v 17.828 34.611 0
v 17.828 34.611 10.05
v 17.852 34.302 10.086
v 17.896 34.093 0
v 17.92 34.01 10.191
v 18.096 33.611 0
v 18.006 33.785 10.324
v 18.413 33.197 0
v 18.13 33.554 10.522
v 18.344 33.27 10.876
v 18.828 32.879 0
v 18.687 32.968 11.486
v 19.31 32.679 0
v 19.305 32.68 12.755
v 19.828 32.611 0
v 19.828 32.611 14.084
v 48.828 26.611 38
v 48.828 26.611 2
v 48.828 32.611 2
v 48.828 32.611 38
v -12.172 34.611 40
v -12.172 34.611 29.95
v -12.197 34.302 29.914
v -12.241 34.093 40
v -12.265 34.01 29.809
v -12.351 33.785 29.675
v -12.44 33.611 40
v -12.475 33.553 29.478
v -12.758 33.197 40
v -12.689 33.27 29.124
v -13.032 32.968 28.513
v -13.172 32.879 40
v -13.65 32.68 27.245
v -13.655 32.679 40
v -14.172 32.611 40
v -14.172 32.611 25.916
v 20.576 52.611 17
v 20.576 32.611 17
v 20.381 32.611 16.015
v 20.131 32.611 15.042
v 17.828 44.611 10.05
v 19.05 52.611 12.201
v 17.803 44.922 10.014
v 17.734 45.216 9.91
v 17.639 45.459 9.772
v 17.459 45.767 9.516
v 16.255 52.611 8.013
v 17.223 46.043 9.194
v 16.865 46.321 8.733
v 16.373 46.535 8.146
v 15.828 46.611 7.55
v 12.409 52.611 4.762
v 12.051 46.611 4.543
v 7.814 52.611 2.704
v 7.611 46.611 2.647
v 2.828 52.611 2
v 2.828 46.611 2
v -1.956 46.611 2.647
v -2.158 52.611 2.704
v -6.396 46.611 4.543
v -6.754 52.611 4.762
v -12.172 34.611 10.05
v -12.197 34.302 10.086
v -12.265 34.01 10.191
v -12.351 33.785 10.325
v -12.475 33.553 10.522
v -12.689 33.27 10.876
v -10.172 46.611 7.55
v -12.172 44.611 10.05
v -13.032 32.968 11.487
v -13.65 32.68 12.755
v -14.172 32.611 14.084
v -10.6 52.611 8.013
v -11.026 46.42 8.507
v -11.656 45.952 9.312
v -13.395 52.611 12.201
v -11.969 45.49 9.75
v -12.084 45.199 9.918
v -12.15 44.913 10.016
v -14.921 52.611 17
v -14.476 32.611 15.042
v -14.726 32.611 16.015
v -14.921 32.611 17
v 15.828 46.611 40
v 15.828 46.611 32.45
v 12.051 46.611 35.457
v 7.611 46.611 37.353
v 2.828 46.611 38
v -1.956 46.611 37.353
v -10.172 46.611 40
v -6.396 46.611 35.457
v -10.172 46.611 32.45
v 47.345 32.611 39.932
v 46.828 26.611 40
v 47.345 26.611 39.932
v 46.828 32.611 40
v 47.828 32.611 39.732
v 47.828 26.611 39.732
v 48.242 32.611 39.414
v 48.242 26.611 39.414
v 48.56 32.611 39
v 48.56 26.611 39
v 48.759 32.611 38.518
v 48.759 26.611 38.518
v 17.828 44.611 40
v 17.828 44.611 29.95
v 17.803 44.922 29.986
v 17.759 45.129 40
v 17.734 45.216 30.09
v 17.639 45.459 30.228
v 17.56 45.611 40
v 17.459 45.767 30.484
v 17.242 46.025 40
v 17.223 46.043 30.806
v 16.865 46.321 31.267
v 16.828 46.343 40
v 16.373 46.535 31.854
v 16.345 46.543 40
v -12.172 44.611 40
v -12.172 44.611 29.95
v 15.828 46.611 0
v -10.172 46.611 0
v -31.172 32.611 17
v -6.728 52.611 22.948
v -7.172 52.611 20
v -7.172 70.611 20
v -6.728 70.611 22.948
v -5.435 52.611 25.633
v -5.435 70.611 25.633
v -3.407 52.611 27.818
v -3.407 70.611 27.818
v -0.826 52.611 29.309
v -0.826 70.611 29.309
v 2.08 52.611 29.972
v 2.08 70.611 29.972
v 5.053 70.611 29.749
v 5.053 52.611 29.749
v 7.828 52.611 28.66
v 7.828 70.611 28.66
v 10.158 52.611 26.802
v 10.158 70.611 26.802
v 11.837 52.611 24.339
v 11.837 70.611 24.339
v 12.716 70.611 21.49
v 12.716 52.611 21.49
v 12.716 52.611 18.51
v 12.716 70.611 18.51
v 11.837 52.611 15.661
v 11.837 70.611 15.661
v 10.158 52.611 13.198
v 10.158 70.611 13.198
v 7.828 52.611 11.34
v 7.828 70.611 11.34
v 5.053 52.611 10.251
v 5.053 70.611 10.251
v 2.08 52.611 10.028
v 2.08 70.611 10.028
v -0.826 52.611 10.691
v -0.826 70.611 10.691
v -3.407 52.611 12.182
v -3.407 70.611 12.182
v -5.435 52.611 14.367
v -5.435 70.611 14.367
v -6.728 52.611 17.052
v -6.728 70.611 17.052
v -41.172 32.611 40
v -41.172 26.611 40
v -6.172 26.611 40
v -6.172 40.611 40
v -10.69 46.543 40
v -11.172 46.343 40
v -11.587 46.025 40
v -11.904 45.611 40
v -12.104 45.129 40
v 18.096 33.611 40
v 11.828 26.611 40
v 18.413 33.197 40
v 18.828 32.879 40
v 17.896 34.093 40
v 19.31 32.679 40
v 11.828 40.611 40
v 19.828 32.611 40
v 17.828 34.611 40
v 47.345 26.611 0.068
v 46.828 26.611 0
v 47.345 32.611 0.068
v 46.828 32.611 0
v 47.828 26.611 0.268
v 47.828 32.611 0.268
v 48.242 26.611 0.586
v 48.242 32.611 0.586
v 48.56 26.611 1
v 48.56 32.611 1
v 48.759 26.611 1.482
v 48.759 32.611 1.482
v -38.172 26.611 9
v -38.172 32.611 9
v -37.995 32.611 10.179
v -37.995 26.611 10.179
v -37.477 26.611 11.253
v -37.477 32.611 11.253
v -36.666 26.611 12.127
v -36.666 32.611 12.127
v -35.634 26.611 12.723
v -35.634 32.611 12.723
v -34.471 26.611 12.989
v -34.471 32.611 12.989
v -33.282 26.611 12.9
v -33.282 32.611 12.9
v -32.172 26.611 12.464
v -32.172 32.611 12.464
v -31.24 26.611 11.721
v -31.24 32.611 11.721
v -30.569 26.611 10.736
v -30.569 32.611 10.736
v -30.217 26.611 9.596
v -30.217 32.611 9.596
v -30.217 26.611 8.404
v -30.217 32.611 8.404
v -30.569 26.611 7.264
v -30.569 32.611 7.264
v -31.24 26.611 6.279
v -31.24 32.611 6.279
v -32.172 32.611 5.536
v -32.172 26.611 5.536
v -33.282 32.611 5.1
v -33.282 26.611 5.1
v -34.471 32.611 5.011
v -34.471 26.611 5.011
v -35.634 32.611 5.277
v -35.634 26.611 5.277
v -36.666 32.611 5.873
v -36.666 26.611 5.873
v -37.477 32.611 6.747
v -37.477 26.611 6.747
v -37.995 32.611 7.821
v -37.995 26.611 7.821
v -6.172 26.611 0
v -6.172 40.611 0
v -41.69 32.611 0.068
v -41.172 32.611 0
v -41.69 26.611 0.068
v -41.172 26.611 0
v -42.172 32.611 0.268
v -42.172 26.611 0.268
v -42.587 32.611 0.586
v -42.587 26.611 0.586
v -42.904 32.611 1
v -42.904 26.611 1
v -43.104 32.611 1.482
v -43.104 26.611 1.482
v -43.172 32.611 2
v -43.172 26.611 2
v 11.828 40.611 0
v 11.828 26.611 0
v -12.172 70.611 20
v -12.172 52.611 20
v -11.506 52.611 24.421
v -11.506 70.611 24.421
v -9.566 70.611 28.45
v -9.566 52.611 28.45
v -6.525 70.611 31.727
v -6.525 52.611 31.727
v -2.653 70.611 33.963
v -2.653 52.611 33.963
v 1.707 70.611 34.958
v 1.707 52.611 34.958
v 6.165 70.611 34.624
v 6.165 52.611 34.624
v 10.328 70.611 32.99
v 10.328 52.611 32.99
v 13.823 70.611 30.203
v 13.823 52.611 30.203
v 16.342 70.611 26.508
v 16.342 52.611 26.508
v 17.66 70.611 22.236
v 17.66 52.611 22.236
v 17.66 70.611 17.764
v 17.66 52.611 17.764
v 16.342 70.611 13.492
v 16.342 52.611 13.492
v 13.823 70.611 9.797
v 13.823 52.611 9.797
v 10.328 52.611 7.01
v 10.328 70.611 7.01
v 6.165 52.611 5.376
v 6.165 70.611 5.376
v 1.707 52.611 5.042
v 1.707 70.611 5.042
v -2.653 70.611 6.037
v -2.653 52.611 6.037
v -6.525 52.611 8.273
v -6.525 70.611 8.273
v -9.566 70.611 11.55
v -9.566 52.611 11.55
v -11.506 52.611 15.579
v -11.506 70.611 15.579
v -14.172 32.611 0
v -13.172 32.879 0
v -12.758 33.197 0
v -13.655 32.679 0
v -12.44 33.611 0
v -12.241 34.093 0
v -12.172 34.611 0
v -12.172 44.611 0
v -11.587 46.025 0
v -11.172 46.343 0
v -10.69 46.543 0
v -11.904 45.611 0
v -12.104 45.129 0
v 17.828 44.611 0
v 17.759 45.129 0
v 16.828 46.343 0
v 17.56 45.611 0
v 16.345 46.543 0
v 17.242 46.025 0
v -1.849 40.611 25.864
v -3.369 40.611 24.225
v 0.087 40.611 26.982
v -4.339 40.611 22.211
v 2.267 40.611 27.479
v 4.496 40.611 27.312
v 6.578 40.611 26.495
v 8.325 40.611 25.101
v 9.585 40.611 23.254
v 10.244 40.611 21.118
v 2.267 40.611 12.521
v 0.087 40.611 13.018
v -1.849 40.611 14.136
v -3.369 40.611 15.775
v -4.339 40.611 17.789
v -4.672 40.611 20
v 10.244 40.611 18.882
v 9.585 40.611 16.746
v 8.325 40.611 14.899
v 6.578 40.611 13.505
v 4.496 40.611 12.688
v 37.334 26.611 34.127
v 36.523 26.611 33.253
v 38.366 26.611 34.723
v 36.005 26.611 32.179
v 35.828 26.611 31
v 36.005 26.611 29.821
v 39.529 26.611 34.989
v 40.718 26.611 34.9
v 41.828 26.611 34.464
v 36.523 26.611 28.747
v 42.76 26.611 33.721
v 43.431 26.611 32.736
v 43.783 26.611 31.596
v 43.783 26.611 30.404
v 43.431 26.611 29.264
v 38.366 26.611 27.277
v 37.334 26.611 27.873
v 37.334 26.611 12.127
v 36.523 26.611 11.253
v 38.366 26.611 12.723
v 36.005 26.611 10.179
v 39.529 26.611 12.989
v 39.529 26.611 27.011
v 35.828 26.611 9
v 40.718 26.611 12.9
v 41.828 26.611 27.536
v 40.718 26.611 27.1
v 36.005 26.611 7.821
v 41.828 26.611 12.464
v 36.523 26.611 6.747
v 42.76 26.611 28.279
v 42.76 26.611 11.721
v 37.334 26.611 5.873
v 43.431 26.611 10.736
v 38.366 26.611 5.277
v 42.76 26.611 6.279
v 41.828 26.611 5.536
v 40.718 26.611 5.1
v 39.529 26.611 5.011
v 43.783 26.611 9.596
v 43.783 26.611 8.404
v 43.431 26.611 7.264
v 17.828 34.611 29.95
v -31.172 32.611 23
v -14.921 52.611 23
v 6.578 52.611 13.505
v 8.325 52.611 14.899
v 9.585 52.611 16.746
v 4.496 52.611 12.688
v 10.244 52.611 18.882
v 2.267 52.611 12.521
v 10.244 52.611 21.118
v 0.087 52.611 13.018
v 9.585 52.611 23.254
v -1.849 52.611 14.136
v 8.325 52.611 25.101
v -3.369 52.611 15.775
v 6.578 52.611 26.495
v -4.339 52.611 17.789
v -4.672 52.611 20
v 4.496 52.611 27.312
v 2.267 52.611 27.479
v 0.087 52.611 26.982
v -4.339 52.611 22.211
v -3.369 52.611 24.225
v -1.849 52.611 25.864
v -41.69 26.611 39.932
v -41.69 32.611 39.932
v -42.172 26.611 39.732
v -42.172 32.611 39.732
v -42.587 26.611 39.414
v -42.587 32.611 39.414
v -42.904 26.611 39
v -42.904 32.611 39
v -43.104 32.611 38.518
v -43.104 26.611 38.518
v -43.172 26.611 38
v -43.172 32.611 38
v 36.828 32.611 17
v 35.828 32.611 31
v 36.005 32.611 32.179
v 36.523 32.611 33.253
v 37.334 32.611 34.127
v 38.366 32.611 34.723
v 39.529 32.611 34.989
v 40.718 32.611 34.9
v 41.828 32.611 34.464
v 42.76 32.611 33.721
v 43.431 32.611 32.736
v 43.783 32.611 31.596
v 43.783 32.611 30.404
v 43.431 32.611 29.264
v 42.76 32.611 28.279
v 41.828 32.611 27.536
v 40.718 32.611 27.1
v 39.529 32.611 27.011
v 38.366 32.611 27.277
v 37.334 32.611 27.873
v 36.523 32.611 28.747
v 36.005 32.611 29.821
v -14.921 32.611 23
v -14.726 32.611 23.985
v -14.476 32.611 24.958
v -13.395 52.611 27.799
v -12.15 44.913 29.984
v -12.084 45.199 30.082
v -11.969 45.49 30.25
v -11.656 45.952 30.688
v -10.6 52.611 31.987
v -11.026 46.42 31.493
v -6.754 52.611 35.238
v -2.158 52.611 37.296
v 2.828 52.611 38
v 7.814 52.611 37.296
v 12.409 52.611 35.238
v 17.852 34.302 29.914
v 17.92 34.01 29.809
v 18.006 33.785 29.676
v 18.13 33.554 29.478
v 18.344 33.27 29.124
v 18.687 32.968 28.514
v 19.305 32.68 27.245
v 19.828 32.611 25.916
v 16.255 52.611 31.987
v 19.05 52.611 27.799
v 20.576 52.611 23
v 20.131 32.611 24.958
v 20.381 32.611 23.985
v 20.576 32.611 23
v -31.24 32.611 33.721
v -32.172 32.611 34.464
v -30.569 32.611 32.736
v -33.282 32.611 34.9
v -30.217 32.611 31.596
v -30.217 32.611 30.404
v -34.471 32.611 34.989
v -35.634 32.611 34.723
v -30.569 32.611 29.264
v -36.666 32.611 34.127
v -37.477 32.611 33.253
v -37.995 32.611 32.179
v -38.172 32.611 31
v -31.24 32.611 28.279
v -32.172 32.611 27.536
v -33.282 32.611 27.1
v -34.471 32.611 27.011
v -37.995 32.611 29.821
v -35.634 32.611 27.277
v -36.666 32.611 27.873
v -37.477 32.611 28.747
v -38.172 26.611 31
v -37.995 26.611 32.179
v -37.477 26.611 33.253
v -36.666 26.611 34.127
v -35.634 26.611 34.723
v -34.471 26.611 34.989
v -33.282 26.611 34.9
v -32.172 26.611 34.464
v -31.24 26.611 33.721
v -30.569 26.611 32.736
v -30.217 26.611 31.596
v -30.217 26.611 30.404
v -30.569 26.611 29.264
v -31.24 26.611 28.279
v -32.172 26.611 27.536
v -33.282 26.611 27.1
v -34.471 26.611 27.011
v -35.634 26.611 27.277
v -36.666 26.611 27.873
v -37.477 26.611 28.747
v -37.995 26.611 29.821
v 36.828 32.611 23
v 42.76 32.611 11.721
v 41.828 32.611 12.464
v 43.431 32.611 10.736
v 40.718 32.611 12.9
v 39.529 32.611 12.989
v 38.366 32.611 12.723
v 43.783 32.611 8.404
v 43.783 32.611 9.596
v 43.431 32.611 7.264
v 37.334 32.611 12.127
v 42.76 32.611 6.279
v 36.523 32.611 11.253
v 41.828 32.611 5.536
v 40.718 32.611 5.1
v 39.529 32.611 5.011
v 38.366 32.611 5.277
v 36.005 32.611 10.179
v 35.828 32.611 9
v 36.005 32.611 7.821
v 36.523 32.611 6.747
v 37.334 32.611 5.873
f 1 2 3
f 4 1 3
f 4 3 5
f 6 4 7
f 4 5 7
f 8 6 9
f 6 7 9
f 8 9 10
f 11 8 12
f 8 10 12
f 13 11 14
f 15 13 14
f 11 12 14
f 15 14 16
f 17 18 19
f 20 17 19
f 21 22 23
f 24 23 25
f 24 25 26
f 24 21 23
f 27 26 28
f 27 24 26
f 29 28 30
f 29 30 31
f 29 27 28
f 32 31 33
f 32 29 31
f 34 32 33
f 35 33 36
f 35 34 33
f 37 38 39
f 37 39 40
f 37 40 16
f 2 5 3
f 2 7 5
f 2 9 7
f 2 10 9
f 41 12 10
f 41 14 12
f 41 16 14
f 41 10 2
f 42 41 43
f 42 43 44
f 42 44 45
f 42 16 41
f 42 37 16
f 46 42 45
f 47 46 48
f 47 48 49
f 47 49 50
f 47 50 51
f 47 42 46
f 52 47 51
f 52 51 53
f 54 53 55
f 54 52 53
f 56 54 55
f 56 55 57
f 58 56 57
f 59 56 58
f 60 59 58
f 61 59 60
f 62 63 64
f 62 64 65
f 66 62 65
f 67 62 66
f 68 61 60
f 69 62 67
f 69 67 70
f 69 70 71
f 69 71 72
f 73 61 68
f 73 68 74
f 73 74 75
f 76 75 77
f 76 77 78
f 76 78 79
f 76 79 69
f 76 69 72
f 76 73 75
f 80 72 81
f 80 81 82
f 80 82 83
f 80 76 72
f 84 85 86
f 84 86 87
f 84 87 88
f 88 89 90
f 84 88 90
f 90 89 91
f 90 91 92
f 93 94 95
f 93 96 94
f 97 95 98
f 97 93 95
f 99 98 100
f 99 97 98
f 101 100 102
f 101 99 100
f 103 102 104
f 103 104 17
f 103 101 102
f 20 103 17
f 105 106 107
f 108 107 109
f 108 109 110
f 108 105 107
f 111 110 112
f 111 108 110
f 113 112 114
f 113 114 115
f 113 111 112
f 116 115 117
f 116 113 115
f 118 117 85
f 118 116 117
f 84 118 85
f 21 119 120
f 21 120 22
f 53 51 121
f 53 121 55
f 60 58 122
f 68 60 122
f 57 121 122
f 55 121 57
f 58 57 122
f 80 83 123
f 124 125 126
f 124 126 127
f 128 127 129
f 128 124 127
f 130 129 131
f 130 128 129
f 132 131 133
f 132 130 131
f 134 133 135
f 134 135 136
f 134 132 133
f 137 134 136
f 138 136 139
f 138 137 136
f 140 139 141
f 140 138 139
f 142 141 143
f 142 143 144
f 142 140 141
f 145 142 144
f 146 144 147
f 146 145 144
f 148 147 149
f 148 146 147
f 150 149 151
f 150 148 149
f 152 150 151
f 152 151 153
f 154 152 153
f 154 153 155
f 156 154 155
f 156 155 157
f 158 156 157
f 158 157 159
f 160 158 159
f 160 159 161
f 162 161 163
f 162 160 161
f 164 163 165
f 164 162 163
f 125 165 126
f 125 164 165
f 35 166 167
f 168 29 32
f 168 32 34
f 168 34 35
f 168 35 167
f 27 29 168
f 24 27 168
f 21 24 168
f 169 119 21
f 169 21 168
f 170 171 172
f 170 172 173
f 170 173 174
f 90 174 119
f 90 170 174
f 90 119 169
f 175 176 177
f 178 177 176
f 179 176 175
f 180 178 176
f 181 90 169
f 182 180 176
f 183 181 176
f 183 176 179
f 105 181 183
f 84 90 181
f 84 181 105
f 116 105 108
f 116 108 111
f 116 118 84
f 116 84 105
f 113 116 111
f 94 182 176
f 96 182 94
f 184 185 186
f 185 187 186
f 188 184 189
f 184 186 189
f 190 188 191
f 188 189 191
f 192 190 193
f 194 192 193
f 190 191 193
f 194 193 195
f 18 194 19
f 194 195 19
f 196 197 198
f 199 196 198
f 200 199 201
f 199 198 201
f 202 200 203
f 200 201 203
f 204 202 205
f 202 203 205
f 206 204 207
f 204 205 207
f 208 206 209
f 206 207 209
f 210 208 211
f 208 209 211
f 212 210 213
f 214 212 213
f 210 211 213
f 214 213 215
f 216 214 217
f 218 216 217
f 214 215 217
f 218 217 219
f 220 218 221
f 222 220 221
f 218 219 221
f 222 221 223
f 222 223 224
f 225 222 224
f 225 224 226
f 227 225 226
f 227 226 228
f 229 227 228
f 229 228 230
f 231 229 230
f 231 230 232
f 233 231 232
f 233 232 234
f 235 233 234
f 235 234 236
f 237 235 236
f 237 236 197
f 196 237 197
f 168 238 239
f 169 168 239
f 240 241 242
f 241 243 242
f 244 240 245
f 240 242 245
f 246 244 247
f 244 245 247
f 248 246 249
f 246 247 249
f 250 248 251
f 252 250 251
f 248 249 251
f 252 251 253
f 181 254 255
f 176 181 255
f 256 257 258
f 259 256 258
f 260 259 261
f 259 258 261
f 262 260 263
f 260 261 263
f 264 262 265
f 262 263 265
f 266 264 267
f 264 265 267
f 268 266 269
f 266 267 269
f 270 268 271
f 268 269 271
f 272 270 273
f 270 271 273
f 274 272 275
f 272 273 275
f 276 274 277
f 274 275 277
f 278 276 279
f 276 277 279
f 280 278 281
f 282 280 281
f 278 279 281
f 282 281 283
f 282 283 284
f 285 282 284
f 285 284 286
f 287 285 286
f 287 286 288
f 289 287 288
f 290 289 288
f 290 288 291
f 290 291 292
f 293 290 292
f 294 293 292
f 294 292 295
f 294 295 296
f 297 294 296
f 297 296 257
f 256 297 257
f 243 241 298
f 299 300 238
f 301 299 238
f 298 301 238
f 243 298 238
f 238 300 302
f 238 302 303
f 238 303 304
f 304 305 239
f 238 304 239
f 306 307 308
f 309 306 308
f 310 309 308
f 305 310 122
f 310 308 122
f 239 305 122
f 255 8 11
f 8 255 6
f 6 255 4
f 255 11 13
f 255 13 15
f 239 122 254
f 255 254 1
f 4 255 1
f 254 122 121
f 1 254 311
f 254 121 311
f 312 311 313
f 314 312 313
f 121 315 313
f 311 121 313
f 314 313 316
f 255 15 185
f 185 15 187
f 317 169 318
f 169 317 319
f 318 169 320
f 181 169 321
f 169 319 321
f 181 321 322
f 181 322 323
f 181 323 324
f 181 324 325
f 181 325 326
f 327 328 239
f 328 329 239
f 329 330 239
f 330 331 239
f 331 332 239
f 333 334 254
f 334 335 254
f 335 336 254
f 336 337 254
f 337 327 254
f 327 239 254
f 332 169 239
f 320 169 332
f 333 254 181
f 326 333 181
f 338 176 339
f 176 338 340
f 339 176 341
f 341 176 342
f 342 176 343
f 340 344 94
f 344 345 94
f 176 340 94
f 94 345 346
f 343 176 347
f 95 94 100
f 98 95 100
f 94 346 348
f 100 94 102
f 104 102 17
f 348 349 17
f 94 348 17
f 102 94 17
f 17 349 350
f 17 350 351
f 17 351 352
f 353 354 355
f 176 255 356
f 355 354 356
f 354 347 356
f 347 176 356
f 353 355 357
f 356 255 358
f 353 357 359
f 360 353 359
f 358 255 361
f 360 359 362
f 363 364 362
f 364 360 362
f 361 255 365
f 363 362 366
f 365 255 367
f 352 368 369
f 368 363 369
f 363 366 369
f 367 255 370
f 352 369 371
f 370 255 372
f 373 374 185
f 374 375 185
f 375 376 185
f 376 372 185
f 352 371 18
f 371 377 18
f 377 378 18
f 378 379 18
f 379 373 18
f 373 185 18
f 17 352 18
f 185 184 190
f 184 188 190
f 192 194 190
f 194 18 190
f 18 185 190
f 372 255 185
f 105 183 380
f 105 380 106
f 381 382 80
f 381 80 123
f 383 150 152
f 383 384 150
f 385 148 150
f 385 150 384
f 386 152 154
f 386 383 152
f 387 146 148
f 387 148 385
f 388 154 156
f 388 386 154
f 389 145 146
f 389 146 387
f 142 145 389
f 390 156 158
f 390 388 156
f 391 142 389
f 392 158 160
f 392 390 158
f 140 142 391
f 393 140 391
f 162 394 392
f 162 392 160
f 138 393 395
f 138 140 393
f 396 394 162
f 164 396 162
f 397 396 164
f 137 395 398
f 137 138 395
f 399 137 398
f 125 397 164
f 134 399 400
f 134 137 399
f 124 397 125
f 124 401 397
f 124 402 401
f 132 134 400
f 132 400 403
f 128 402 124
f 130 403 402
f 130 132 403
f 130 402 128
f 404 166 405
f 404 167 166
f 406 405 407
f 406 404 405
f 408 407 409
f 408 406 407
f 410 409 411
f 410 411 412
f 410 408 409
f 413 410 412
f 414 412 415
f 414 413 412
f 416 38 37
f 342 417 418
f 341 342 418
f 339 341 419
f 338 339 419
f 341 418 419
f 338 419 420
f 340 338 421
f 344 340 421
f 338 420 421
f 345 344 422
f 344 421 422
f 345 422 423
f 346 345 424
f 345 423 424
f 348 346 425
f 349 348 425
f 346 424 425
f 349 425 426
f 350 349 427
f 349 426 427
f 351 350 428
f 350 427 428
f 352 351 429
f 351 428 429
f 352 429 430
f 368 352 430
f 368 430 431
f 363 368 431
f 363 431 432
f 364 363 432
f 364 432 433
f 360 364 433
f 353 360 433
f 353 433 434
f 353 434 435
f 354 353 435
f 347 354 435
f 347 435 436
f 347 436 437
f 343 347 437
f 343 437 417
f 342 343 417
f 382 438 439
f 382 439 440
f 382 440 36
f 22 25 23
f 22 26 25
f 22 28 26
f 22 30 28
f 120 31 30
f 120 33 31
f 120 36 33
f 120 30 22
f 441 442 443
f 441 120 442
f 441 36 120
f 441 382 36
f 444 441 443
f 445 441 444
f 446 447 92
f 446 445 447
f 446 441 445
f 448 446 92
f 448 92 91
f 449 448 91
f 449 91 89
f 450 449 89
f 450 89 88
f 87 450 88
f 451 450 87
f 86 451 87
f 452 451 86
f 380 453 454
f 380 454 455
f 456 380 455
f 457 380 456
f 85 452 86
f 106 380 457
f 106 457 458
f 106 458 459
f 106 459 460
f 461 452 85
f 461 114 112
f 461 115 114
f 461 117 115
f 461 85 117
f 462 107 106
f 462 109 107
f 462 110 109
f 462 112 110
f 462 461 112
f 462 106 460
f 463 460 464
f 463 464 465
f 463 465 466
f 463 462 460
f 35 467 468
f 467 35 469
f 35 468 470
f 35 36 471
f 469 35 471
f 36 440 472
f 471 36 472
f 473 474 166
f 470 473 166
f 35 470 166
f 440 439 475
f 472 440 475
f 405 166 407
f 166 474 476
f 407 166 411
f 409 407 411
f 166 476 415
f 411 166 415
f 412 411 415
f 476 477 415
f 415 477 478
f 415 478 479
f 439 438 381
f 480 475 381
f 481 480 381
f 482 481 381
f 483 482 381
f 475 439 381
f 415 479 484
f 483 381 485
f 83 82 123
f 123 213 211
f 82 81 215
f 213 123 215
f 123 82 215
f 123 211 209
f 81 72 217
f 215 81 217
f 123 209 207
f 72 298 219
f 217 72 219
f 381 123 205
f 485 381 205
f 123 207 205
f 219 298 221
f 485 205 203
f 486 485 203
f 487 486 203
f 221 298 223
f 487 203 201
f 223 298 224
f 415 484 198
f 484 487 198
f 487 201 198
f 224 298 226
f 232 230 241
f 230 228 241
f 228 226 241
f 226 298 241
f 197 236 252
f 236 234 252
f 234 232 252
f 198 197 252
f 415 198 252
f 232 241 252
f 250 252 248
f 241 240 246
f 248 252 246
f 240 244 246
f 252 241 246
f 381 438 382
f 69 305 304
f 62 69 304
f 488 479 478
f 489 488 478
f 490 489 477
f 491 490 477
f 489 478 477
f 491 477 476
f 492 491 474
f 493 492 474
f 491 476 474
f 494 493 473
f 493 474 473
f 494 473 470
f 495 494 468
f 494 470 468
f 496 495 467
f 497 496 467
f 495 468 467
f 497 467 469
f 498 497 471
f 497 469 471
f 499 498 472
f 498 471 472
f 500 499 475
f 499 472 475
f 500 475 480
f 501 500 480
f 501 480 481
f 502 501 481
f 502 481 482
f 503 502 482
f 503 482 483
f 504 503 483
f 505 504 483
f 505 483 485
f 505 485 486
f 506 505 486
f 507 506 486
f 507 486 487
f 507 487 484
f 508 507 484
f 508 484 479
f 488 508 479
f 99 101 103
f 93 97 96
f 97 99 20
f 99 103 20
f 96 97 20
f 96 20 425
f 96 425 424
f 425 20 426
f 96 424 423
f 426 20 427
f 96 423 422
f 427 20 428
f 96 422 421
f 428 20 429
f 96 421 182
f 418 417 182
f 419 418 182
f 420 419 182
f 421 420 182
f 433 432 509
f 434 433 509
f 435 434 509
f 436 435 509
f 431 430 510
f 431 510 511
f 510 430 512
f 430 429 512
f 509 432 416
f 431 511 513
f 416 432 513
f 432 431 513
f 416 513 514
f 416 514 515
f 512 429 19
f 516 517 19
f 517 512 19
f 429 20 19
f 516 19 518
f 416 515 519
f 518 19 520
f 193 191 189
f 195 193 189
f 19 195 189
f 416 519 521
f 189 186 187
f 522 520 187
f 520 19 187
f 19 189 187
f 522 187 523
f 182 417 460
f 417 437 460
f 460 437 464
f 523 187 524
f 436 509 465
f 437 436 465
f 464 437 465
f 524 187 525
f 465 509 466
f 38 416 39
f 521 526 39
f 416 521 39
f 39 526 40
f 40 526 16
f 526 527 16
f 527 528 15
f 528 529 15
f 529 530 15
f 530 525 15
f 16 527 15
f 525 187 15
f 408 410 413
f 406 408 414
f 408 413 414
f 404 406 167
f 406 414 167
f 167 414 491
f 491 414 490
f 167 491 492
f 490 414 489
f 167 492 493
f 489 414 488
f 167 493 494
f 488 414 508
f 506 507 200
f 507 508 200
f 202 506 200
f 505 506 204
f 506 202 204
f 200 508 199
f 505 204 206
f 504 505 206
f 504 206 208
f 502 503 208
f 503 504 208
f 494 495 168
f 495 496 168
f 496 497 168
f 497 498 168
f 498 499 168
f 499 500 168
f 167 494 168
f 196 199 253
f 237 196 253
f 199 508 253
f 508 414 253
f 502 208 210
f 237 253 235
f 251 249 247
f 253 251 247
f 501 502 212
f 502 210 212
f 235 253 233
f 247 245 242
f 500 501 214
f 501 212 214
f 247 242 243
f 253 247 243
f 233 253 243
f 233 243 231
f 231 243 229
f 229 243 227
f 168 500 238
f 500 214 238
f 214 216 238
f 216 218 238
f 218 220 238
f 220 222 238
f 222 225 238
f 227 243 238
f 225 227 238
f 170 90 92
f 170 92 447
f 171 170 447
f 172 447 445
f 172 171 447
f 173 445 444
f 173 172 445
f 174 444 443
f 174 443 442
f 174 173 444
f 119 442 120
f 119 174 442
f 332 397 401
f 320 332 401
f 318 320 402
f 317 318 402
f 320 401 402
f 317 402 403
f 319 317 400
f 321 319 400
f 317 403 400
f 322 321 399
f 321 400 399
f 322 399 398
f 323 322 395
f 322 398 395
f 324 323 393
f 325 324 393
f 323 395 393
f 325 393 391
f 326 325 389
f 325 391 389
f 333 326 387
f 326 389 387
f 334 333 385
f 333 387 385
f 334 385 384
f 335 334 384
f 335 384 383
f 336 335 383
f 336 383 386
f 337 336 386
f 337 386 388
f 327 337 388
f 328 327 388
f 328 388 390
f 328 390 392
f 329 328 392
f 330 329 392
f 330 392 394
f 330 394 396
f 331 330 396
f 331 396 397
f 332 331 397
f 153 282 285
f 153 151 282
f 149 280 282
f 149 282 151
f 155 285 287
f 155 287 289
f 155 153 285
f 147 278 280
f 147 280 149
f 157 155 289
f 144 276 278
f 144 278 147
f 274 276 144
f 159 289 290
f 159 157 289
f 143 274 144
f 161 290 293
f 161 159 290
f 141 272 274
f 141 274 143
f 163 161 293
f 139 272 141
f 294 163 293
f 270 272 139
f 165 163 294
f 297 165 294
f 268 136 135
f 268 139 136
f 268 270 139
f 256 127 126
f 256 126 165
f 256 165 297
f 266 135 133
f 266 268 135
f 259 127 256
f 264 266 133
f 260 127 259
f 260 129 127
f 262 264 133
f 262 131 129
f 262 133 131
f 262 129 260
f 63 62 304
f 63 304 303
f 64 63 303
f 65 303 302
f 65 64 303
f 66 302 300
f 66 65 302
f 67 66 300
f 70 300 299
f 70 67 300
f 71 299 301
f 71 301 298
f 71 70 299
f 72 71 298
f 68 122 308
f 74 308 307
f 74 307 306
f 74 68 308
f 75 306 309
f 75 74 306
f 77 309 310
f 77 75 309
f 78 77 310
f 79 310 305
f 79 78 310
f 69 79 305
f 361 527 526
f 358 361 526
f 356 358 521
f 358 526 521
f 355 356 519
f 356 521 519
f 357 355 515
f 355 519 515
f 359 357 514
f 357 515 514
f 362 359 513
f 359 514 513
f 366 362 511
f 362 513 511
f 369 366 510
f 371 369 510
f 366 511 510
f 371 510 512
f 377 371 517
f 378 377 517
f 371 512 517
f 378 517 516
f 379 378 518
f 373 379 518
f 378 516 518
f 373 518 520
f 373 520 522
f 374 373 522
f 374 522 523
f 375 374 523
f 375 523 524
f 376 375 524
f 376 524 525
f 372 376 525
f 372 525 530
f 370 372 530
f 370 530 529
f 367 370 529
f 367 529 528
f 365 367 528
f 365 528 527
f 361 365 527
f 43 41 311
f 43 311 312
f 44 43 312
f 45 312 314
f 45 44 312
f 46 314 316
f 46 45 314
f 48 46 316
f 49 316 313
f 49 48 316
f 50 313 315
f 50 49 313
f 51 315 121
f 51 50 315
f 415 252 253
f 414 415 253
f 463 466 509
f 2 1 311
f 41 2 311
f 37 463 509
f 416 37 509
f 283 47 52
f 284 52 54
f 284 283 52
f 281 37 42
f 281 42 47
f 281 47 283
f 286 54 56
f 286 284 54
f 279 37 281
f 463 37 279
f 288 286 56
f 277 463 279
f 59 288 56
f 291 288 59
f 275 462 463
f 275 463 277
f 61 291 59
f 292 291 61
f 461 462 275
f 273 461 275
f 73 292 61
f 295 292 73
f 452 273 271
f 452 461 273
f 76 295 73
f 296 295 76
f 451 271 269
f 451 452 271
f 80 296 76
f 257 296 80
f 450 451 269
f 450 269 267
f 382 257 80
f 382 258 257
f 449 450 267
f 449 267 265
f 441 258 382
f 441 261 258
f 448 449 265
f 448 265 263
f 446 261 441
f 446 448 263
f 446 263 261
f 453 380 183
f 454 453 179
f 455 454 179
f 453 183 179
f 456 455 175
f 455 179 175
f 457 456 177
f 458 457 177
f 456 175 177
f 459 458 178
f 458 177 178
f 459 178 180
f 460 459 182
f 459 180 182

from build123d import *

# Parameters (mm, degrees)
Y_KSEKLIK_EKSTR_ZYON1_DEPTH = 40
RADYUS1_R                   = 2
RADYUS2_R                   = 2
RADYUS4_R                   = 2
RADYUS5_R                   = 2
IZIM5_R                     = 4
KES_EKSTR_ZYON1_DEPTH       = 65.653926759
Y_KSEKLIK_EKSTR_ZYON3_REACH = 70.265
IZIM7_R                     = 18
IZIM8_R                     = 15
IZIM8_R_2                   = 10
Y_KSEKLIK_EKSTR_ZYON4_DEPTH = 18
IZIM9_R                     = 7.5
KES_EKSTR_ZYON3_DEPTH       = 69.265146695
IZIM12_W                    = 6
IZIM12_H                    = 20
Y_KSEKLIK_EKSTR_ZYON5_DEPTH = 19
IZIM13_W                    = 6
IZIM13_H                    = 20
Y_KSEKLIK_EKSTR_ZYON6_DEPTH = 19
KES_EKSTR_ZYON4_DEPTH       = 89.876489715


with BuildPart() as part:
    # Çizim1 → Yükseklik-Ekstrüzyon1 (new body)
    with BuildSketch(Plane.XY):
        Polygon((-43.172443791, 26.610906907), (-6.172443791, 26.610906907), (-6.172443791, 40.610906907), (11.827556209, 40.610906907), (11.827556209, 26.610906907), (48.827556209, 26.610906907), (48.827556209, 32.610906907), (17.827556209, 32.610906907), (17.827556209, 46.610906907), (-12.172443791, 46.610906907), (-12.172443791, 32.610906907), (-43.172443791, 32.610906907), align=None)
    extrude(amount=Y_KSEKLIK_EKSTR_ZYON1_DEPTH)

    # Radyus1
    radyus1_edges = [part.edges().sort_by_distance(p)[0] for p in [
        (-12.172443791, 46.610906907, 20),
        (17.827556209, 46.610906907, 20),
    ]]
    fillet(radyus1_edges, radius=RADYUS1_R)

    # Radyus2
    radyus2_edges = [part.edges().sort_by_distance(p)[0] for p in [
        (-12.172443791, 32.610906907, 20),
        (17.827556209, 32.610906907, 20),
    ]]
    fillet(radyus2_edges, radius=RADYUS2_R)

    # Radyus4
    radyus4_edges = [part.edges().sort_by_distance(p)[0] for p in [
        (-43.172443791, 29.610906907, 0),
        (48.827556209, 29.610906907, 40),
        (-43.172443791, 29.610906907, 40),
    ]]
    fillet(radyus4_edges, radius=RADYUS4_R)

    # Radyus5
    radyus5_edges = [part.edges().sort_by_distance(p)[0] for p in [
        (48.827556209, 29.610906907, 0),
    ]]
    fillet(radyus5_edges, radius=RADYUS5_R)

    # Çizim5 → Kes-Ekstrüzyon1 (cut, through all)
    with BuildSketch(Plane(origin=(0, 32.610906907, 0), x_dir=(1, 0, 0), z_dir=(0, 1, 0))):
        with Locations(Location((-34.172443791, -9, 0), (0, 0, 180))):
            Circle(IZIM5_R)
        with Locations(Location((-34.172443791, -31, 0), (0, 0, 180))):
            Circle(IZIM5_R)
        with Locations(Location((39.827556209, -9, 0), (0, 0, 180))):
            Circle(IZIM5_R)
        with Locations(Location((39.827556209, -31, 0), (0, 0, 180))):
            Circle(IZIM5_R)
    extrude(amount=-KES_EKSTR_ZYON1_DEPTH, mode=Mode.SUBTRACT)

    # Çizim7 → Yükseklik-Ekstrüzyon3 (add, up to next)
    with BuildSketch(Plane(origin=(0, 52.610906907, 0), x_dir=(1, 0, 0), z_dir=(0, 1, 0)), mode=Mode.PRIVATE) as y_kseklik_ekstr_zyon3_sk1:
        with Locations(Location((2.827556209, -20, 0), (0, 0, 180))):
            Circle(IZIM7_R)
    y_kseklik_ekstr_zyon3_tool1 = extrude(y_kseklik_ekstr_zyon3_sk1.sketch, amount=-Y_KSEKLIK_EKSTR_ZYON3_REACH, mode=Mode.PRIVATE) - part.part
    add(y_kseklik_ekstr_zyon3_tool1.solids().sort_by_distance((2.827556, 52.610907, 20))[0])

    # Çizim8 → Yükseklik-Ekstrüzyon4 (add)
    with BuildSketch(Plane(origin=(0, 52.610906907, 0), x_dir=(1, 0, 0), z_dir=(0, 1, 0))):
        with Locations(Location((2.827556209, -20, 0), (0, 0, 180))):
            Circle(IZIM8_R)
        with Locations(Location((2.827556209, -20, 0), (0, 0, 180))):
            Circle(IZIM8_R_2, mode=Mode.SUBTRACT)
    extrude(amount=Y_KSEKLIK_EKSTR_ZYON4_DEPTH)

    # Çizim9 → Kes-Ekstrüzyon3 (cut, through all)
    with BuildSketch(Plane(origin=(0, 52.610906907, 0), x_dir=(1, 0, 0), z_dir=(0, 1, 0))):
        with Locations(Location((2.827556209, -20, 0), (0, 0, 180))):
            Circle(IZIM9_R)
    extrude(amount=-KES_EKSTR_ZYON3_DEPTH, mode=Mode.SUBTRACT)

    # Çizim12 → Yükseklik-Ekstrüzyon5 (add)
    with BuildSketch(Plane.ZY.offset(12.172443791)):
        with Locations((20, 42.610906907)):
            Rectangle(IZIM12_W, IZIM12_H)
    extrude(amount=Y_KSEKLIK_EKSTR_ZYON5_DEPTH)

    # Çizim13 → Yükseklik-Ekstrüzyon6 (add)
    with BuildSketch(Plane(origin=(17.827556209, 0, 0), x_dir=(0, 0, -1), z_dir=(1, 0, 0))):
        with Locations((-20, 42.610906907)):
            Rectangle(IZIM13_W, IZIM13_H)
    extrude(amount=Y_KSEKLIK_EKSTR_ZYON6_DEPTH)

    # Çizim14 → Kes-Ekstrüzyon4 (cut, through all)
    with BuildSketch(Plane.XY.offset(23)):
        Polygon((-14.920683141, 52.610906907), (-31.172443791, 32.610906907), (-51.091158716, 48.796616278), (-34.839398065, 68.796616278), align=None)
        Polygon((20.575795558, 52.610906907), (36.827556209, 32.610906907), (59.044395874, 50.664044939), (42.792635223, 70.664044939), align=None)
    extrude(amount=-KES_EKSTR_ZYON4_DEPTH, mode=Mode.SUBTRACT)


solid = part.part
